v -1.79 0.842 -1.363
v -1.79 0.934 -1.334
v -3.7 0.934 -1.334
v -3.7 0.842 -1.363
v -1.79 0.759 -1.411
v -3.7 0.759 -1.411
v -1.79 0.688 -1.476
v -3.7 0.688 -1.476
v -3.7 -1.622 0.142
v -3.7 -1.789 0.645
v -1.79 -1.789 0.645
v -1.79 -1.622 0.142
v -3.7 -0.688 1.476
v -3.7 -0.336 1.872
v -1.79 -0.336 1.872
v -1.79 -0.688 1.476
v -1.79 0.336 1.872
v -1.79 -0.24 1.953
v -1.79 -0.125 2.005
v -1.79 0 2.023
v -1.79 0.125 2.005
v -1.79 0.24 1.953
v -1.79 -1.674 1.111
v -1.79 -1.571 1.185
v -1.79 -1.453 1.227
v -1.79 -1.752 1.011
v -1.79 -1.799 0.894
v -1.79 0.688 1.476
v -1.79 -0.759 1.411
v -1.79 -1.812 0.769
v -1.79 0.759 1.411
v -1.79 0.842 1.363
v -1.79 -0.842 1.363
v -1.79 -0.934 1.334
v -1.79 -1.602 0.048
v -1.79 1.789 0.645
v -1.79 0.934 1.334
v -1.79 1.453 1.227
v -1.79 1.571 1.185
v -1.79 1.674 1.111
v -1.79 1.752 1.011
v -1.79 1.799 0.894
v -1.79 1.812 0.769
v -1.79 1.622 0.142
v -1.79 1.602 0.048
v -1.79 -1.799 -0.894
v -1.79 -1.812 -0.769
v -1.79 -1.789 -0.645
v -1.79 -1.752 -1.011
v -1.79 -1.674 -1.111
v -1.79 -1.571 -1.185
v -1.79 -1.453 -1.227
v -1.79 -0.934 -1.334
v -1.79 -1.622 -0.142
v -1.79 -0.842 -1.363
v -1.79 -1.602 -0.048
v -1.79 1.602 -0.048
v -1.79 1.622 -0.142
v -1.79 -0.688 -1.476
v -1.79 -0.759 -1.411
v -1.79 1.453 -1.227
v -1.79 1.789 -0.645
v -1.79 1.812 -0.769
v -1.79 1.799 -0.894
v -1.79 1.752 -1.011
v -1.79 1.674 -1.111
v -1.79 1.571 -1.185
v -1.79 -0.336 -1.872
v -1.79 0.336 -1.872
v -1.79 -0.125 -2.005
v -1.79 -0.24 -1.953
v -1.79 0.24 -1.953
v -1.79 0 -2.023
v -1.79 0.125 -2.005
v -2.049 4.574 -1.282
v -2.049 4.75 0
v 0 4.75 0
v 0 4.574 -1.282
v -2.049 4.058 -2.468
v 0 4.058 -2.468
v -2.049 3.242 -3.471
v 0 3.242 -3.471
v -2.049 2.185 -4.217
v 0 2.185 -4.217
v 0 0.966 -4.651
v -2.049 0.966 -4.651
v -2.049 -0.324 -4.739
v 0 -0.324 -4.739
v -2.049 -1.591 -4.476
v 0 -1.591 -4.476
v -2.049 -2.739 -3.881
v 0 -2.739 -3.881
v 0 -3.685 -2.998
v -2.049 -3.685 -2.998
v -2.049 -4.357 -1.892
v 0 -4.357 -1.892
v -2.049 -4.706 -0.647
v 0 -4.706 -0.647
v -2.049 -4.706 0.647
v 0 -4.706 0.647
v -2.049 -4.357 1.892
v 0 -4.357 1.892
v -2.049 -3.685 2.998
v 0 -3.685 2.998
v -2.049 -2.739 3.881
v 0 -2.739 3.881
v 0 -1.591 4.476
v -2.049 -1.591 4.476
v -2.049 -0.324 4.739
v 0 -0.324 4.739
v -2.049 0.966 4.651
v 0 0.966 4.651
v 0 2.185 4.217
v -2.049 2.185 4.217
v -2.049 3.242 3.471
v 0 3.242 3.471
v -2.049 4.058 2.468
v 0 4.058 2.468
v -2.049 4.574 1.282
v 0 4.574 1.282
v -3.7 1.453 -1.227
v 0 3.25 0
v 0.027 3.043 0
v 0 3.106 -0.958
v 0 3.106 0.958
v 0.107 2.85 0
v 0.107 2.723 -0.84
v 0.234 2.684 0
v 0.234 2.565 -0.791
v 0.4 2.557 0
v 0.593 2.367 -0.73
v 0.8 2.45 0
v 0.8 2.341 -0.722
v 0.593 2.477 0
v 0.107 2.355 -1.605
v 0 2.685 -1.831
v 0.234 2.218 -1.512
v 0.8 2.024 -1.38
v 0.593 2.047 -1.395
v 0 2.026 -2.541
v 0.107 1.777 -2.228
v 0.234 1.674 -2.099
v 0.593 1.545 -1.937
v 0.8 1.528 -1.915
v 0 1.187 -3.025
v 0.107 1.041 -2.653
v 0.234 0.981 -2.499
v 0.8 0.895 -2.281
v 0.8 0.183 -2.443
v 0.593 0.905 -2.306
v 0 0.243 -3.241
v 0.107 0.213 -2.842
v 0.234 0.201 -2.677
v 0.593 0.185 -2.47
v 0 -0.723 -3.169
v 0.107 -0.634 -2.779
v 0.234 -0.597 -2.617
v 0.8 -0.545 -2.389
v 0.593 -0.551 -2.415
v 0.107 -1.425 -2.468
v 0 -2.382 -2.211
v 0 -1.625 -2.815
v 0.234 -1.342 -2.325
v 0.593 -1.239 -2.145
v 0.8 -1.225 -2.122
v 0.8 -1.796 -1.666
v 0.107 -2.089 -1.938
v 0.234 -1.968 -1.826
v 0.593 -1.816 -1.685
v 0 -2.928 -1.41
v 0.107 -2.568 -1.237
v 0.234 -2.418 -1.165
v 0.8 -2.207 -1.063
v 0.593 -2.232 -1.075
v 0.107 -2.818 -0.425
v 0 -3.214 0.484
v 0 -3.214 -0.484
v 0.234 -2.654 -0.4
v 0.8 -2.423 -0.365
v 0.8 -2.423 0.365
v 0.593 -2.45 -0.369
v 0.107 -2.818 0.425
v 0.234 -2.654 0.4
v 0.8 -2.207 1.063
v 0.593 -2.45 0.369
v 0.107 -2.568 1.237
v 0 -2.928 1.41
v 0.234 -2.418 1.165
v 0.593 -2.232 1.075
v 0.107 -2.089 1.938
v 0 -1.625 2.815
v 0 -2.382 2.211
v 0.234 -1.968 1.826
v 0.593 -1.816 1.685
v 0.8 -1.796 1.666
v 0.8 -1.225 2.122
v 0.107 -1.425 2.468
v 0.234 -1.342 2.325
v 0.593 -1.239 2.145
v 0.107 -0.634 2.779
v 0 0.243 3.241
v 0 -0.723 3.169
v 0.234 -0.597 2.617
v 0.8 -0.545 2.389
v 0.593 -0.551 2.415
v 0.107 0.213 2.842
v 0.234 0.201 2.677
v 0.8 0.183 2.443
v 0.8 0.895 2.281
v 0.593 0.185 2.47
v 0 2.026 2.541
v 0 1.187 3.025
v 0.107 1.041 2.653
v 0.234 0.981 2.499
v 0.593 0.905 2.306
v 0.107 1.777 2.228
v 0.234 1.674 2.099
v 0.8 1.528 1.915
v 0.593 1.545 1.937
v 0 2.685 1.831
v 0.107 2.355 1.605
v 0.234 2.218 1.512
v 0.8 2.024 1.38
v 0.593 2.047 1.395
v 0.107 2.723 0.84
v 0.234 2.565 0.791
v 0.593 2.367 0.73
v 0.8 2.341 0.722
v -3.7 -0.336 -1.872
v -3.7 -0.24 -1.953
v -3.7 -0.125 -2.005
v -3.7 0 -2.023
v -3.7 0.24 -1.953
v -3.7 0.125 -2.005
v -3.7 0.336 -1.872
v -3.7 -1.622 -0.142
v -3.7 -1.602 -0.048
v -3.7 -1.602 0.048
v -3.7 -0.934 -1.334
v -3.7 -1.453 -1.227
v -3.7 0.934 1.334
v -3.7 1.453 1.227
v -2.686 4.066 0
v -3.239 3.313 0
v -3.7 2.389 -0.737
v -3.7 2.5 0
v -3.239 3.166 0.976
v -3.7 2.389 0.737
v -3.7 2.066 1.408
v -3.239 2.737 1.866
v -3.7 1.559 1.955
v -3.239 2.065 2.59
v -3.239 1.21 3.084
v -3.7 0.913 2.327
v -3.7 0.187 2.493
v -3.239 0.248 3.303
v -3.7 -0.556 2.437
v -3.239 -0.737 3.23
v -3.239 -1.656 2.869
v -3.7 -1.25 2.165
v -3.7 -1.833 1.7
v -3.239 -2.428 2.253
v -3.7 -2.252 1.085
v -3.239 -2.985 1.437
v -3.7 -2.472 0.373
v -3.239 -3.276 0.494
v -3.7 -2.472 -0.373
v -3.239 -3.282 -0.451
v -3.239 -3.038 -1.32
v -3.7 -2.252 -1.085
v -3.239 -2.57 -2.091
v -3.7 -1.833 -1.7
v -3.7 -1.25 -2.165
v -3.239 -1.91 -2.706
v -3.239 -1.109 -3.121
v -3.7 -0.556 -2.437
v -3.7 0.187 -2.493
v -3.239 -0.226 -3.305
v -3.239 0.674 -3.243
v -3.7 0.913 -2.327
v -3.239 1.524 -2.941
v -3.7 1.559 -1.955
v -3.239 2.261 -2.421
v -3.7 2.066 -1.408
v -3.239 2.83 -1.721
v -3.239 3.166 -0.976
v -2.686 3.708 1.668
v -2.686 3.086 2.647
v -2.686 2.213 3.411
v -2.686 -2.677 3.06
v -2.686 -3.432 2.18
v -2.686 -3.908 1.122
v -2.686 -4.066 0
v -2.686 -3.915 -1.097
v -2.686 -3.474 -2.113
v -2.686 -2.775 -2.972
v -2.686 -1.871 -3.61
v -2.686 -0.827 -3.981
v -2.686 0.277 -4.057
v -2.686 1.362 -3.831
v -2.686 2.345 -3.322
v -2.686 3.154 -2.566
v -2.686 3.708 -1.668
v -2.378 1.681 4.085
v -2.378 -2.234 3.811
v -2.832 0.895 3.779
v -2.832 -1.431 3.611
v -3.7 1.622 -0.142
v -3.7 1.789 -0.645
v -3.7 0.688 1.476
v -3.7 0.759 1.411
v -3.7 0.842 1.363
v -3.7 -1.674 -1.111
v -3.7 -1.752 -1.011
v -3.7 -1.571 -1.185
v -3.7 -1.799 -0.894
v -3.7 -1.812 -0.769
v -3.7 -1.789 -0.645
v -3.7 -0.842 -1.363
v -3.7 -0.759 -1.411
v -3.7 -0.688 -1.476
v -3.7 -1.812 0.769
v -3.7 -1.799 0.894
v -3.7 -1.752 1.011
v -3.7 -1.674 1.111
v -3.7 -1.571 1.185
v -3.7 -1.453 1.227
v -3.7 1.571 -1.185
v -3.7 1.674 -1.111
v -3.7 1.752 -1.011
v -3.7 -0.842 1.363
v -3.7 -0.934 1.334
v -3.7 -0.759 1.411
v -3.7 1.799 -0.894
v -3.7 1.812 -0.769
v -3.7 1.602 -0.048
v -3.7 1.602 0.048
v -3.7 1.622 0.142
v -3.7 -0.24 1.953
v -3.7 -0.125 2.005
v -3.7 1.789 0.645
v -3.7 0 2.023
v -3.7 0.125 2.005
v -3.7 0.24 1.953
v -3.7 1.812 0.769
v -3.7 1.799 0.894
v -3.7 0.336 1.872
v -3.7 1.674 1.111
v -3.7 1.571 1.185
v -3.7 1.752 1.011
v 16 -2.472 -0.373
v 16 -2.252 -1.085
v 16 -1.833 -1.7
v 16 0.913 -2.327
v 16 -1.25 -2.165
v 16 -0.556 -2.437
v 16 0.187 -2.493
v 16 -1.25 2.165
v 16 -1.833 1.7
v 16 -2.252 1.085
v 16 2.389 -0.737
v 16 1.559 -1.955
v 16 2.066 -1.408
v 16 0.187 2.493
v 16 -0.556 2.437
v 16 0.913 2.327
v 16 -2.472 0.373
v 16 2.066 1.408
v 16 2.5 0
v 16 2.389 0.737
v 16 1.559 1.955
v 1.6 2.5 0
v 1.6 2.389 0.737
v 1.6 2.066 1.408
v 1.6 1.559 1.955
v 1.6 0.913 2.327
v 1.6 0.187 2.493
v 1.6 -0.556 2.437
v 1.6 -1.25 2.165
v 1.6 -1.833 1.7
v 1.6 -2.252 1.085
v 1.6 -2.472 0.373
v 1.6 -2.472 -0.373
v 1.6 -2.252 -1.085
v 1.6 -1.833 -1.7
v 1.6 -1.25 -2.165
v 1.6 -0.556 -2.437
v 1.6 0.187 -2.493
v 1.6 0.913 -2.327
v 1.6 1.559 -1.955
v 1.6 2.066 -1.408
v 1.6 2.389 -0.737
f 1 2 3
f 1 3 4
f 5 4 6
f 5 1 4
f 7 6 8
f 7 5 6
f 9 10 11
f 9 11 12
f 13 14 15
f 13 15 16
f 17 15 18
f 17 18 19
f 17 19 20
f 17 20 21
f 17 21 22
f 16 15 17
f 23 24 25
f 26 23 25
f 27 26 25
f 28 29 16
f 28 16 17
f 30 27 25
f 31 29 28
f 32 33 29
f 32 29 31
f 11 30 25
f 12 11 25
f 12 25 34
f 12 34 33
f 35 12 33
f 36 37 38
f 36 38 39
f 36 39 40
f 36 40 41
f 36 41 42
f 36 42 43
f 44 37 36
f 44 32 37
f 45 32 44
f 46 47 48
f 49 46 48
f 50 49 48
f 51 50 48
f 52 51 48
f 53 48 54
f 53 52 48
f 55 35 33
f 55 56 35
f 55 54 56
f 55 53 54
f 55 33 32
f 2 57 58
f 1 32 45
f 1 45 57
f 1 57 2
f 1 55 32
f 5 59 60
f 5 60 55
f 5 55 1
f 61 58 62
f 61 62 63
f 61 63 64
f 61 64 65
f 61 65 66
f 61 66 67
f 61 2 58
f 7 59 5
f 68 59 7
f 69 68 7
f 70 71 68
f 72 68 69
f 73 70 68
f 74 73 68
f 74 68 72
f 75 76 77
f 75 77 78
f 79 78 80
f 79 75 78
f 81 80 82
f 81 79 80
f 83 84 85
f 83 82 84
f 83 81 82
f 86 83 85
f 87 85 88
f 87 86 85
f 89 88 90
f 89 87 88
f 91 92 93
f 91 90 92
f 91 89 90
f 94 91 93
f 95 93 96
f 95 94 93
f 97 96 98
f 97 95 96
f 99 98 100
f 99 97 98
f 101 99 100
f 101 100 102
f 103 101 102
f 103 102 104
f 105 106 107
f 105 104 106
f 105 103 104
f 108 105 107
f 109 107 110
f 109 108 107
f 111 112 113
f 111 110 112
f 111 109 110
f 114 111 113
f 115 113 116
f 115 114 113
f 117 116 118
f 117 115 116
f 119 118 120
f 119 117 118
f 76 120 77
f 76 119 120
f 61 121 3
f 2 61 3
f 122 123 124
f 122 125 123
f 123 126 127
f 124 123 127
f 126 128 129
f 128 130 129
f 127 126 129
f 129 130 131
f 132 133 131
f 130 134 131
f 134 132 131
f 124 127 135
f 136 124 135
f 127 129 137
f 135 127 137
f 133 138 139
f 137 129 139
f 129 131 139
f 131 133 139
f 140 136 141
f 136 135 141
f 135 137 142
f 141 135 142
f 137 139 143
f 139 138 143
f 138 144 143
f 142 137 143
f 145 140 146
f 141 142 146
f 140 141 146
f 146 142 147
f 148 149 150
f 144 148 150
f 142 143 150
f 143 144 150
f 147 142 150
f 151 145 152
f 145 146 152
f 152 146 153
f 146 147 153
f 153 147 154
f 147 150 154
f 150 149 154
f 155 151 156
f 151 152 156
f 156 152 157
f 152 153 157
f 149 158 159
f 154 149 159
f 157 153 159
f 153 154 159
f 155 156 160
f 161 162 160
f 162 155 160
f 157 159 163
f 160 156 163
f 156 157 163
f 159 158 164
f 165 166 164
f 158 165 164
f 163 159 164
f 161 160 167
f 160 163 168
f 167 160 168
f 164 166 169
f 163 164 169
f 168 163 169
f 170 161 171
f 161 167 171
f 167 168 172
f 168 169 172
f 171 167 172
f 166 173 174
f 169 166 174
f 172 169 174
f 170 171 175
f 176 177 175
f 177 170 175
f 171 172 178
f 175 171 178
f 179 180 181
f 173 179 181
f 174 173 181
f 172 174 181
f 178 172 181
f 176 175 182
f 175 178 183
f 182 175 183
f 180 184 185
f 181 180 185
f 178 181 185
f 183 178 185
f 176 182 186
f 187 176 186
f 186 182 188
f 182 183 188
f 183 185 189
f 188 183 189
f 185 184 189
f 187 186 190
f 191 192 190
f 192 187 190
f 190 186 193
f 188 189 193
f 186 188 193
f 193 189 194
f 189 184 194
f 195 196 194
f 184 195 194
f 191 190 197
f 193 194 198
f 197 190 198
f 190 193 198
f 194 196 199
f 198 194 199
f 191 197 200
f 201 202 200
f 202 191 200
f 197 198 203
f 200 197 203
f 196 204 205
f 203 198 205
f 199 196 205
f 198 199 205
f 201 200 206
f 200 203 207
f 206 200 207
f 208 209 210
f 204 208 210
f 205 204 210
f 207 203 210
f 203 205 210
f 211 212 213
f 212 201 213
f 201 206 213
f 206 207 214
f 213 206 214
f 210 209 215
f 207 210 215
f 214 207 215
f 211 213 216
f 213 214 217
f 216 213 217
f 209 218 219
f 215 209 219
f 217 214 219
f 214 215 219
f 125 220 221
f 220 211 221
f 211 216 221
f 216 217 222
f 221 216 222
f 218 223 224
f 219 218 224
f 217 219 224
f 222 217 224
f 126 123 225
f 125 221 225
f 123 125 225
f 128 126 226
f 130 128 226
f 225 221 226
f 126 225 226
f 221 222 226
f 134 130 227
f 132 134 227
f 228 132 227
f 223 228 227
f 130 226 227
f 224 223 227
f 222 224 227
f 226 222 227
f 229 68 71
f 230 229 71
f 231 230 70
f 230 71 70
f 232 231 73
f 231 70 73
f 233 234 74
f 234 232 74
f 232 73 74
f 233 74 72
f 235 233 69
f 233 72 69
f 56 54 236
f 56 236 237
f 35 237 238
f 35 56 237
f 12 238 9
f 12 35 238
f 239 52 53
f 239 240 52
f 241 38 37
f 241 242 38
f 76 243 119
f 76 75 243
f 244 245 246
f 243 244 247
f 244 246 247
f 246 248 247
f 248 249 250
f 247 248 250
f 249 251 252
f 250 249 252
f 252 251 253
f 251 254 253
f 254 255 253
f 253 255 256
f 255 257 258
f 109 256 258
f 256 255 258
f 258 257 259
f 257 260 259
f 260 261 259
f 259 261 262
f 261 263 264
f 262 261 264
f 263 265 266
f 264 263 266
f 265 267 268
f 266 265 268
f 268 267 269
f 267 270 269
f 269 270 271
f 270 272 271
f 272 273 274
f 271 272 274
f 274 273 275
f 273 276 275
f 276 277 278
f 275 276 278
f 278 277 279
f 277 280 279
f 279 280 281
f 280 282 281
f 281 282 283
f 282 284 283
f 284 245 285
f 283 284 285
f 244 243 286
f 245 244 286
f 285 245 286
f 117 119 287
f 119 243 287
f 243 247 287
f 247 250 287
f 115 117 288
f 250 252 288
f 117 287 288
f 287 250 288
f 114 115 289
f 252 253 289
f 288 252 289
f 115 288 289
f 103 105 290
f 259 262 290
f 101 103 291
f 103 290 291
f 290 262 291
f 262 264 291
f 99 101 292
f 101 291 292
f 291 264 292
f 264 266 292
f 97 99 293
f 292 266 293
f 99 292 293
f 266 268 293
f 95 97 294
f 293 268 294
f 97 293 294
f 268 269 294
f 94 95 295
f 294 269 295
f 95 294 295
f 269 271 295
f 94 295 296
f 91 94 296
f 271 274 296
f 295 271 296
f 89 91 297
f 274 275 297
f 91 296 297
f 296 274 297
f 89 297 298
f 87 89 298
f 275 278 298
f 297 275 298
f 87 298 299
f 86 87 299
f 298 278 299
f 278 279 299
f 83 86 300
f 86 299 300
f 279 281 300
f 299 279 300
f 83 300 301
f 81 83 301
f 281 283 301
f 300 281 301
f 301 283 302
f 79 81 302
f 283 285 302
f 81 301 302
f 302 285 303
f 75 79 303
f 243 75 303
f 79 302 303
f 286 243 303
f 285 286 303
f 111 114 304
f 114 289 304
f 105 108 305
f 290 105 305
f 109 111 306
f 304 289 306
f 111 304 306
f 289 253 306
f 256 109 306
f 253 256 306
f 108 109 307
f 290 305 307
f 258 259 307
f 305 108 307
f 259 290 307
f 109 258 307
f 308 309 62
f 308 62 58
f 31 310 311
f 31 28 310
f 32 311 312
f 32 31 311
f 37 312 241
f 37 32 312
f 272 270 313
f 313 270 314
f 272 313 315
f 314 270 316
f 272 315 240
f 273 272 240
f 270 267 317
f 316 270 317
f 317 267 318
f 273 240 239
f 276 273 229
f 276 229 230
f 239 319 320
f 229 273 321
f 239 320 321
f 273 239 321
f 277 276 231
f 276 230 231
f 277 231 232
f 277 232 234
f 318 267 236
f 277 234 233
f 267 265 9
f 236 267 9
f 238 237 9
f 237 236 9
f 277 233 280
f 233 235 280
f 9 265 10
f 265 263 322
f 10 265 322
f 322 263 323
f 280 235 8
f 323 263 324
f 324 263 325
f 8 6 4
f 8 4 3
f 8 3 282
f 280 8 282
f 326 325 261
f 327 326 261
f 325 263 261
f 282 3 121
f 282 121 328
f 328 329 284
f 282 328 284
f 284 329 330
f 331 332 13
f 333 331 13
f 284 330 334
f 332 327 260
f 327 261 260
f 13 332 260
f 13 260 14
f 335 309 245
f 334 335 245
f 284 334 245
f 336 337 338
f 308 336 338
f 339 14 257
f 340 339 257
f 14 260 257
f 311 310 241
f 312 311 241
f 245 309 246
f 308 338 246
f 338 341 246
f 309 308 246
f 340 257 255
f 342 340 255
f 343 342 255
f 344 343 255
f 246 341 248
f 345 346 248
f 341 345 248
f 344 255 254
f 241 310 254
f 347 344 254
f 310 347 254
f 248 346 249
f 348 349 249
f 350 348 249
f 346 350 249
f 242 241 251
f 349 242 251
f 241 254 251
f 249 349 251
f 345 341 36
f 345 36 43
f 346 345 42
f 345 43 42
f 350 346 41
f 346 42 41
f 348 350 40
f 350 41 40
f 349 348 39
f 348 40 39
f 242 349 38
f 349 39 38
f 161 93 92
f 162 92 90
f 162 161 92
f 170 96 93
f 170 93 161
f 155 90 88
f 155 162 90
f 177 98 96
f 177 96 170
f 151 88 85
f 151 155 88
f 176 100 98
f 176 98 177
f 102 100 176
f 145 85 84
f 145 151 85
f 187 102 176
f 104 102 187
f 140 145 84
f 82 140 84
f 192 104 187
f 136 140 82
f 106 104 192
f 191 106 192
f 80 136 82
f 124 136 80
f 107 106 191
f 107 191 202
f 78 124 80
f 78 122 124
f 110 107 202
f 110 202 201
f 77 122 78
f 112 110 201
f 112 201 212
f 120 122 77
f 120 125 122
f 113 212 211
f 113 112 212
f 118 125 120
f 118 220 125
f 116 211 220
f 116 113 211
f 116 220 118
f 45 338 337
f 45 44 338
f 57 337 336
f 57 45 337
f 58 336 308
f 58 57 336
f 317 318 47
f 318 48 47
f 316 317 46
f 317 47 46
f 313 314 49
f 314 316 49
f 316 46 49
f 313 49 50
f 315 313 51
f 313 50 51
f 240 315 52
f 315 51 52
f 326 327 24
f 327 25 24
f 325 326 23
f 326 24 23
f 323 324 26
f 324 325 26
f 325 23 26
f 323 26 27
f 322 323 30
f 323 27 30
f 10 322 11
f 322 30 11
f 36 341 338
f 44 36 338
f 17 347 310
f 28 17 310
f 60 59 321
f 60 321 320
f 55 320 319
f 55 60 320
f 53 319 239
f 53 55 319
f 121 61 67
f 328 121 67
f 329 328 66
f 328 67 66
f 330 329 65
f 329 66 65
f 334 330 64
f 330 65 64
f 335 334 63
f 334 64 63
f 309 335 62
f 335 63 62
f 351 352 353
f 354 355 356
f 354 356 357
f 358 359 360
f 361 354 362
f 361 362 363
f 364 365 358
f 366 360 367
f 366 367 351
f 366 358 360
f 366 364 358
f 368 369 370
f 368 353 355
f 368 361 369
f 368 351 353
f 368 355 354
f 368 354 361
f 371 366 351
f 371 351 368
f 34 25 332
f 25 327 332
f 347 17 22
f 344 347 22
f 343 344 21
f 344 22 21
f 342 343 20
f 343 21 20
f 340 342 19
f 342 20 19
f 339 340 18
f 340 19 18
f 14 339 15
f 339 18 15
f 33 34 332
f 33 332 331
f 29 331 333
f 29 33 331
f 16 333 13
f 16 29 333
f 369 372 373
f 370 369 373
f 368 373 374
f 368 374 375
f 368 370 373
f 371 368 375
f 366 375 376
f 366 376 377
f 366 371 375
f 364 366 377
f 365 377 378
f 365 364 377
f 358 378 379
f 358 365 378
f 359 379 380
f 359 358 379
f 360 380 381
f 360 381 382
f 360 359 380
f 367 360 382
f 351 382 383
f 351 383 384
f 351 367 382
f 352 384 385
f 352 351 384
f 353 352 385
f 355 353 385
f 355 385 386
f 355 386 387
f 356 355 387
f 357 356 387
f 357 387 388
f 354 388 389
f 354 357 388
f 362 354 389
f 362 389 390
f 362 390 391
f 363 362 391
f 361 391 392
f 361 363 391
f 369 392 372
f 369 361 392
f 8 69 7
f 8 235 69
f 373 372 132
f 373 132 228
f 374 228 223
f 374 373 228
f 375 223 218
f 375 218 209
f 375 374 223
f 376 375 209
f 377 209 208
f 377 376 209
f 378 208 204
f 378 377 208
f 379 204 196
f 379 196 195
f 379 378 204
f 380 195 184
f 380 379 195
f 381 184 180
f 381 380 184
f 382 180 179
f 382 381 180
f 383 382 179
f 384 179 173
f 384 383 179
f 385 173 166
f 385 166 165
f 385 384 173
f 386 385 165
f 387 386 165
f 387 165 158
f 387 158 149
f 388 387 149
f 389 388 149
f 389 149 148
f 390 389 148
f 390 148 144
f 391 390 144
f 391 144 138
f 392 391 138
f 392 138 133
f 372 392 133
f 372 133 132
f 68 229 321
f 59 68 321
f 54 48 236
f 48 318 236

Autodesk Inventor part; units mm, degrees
ref_plane "YZ Plane" through (0, 0, 0) normal (1, 0, 0) x (0, 1, 0)
ref_plane "XZ Plane" through (0, 0, 0) normal (0, 1, 0) x (-1, 0, 0)
ref_plane "XY Plane" through (0, 0, 0) normal (0, 0, 1) x (1, 0, 0)
sketch "Sketch4" plane through (0, 0, 0) normal (0, 0, 1) x (1, 0, 0)
  line L0 (-3.7, 0) -> (16, 0)
  line L1 (0, 0) -> (-3.7, 0)
  line L2 (0, 4.75) -> (0, 3.25)
  line L3 (0.8, 2.45) -> (0.8, 2.45)
  line L4 (0.8, 2.45) -> (1.6, 2.5)
  arc A0 (0, 3.25) -> (0.8, 2.45) centre (0.8, 3.25) ccw
  line L5 (-3.7, 0) -> (-3.7, 2.5)
  line L6 (0, 4.75) -> (-2.0492, 4.75)
  arc A1 (-2.0492, 4.75) -> (-3.7, 2.5) centre (3.4767, -1.0349) ccw
  line L7 (1.6, 2.5) -> (16, 2.5)
  line L8 (16, 2.5) -> (16, 0)
  point P0 (0, 2.45)
  dimension "d71" = 0.8
  dimension "d72" = 16
  dimension "d74" = 0.8
  dimension "d75" = 4.9
  dimension "d78" = 5
  dimension "d82" = 8
  dimension "d83" = 3.7
  dimension "d84" = 9.5
  dimension "d104" = 14.4
  dimension "d105" = 5
revolve "Revolution7" add sketch "Sketch4" angle 360 about axis through (-3.7, 0, 0) along (1, 0, 0)
sketch "Sketch5" plane through (-3.7, 0, 0) normal (-1, 0, 0) x (0, 0, 1)
  circle A0 centre (0, 0) radius 2.25 construction
  circle A1 centre (0, 0) radius 1.575 construction
  line L0 (0, 0) -> (-1.364, 0.7875)
  line L1 (0, 0) -> (-1.364, -0.7875)
  line L2 (-1.8008, 0) -> (1.7887, 0)
  line L3 (-2.25, 0) -> (-1.364, -0.7875)
  line L4 (-2.25, 0) -> (-1.364, 0.7875)
  dimension "d88" = 4.5
  dimension "d89" = 3.15
  dimension "d90" = 30
  dimension "d91" = 30
extrude "Extrusion1" cut sketch "Sketch5" against normal blind 1.91
pattern_circular "Circular Pattern1" count 6 over 360 about axis through (-10, 0, 0) along (1, 0, 0) of "Extrusion1"
fillet "Fillet1" radius 0.45 12 edges at (-2.745, -1.9486, -1.125) (-2.745, -0.7875, -1.364) (-2.745, -1.575, 0) (-2.745, -1.9486, 1.125) (-2.745, -0.7875, 1.364) (-2.745, 0, 2.25) (-2.745, 1.575, 0) (-2.745, 1.9486, 1.125) (-2.745, 0.7875, 1.364) (-2.745, 0.7875, -1.364) (-2.745, 0, -2.25) (-2.745, 1.9486, -1.125)
thread "Thread7" size "M5x0.8" class "6g" standard "ISO Metric profile" length 14.4
properties part number "Винты со звездообразным углублением в плоско-выпуклой головке ISO 14583 — M5 x 16 — 4.8" material "Сталь"
